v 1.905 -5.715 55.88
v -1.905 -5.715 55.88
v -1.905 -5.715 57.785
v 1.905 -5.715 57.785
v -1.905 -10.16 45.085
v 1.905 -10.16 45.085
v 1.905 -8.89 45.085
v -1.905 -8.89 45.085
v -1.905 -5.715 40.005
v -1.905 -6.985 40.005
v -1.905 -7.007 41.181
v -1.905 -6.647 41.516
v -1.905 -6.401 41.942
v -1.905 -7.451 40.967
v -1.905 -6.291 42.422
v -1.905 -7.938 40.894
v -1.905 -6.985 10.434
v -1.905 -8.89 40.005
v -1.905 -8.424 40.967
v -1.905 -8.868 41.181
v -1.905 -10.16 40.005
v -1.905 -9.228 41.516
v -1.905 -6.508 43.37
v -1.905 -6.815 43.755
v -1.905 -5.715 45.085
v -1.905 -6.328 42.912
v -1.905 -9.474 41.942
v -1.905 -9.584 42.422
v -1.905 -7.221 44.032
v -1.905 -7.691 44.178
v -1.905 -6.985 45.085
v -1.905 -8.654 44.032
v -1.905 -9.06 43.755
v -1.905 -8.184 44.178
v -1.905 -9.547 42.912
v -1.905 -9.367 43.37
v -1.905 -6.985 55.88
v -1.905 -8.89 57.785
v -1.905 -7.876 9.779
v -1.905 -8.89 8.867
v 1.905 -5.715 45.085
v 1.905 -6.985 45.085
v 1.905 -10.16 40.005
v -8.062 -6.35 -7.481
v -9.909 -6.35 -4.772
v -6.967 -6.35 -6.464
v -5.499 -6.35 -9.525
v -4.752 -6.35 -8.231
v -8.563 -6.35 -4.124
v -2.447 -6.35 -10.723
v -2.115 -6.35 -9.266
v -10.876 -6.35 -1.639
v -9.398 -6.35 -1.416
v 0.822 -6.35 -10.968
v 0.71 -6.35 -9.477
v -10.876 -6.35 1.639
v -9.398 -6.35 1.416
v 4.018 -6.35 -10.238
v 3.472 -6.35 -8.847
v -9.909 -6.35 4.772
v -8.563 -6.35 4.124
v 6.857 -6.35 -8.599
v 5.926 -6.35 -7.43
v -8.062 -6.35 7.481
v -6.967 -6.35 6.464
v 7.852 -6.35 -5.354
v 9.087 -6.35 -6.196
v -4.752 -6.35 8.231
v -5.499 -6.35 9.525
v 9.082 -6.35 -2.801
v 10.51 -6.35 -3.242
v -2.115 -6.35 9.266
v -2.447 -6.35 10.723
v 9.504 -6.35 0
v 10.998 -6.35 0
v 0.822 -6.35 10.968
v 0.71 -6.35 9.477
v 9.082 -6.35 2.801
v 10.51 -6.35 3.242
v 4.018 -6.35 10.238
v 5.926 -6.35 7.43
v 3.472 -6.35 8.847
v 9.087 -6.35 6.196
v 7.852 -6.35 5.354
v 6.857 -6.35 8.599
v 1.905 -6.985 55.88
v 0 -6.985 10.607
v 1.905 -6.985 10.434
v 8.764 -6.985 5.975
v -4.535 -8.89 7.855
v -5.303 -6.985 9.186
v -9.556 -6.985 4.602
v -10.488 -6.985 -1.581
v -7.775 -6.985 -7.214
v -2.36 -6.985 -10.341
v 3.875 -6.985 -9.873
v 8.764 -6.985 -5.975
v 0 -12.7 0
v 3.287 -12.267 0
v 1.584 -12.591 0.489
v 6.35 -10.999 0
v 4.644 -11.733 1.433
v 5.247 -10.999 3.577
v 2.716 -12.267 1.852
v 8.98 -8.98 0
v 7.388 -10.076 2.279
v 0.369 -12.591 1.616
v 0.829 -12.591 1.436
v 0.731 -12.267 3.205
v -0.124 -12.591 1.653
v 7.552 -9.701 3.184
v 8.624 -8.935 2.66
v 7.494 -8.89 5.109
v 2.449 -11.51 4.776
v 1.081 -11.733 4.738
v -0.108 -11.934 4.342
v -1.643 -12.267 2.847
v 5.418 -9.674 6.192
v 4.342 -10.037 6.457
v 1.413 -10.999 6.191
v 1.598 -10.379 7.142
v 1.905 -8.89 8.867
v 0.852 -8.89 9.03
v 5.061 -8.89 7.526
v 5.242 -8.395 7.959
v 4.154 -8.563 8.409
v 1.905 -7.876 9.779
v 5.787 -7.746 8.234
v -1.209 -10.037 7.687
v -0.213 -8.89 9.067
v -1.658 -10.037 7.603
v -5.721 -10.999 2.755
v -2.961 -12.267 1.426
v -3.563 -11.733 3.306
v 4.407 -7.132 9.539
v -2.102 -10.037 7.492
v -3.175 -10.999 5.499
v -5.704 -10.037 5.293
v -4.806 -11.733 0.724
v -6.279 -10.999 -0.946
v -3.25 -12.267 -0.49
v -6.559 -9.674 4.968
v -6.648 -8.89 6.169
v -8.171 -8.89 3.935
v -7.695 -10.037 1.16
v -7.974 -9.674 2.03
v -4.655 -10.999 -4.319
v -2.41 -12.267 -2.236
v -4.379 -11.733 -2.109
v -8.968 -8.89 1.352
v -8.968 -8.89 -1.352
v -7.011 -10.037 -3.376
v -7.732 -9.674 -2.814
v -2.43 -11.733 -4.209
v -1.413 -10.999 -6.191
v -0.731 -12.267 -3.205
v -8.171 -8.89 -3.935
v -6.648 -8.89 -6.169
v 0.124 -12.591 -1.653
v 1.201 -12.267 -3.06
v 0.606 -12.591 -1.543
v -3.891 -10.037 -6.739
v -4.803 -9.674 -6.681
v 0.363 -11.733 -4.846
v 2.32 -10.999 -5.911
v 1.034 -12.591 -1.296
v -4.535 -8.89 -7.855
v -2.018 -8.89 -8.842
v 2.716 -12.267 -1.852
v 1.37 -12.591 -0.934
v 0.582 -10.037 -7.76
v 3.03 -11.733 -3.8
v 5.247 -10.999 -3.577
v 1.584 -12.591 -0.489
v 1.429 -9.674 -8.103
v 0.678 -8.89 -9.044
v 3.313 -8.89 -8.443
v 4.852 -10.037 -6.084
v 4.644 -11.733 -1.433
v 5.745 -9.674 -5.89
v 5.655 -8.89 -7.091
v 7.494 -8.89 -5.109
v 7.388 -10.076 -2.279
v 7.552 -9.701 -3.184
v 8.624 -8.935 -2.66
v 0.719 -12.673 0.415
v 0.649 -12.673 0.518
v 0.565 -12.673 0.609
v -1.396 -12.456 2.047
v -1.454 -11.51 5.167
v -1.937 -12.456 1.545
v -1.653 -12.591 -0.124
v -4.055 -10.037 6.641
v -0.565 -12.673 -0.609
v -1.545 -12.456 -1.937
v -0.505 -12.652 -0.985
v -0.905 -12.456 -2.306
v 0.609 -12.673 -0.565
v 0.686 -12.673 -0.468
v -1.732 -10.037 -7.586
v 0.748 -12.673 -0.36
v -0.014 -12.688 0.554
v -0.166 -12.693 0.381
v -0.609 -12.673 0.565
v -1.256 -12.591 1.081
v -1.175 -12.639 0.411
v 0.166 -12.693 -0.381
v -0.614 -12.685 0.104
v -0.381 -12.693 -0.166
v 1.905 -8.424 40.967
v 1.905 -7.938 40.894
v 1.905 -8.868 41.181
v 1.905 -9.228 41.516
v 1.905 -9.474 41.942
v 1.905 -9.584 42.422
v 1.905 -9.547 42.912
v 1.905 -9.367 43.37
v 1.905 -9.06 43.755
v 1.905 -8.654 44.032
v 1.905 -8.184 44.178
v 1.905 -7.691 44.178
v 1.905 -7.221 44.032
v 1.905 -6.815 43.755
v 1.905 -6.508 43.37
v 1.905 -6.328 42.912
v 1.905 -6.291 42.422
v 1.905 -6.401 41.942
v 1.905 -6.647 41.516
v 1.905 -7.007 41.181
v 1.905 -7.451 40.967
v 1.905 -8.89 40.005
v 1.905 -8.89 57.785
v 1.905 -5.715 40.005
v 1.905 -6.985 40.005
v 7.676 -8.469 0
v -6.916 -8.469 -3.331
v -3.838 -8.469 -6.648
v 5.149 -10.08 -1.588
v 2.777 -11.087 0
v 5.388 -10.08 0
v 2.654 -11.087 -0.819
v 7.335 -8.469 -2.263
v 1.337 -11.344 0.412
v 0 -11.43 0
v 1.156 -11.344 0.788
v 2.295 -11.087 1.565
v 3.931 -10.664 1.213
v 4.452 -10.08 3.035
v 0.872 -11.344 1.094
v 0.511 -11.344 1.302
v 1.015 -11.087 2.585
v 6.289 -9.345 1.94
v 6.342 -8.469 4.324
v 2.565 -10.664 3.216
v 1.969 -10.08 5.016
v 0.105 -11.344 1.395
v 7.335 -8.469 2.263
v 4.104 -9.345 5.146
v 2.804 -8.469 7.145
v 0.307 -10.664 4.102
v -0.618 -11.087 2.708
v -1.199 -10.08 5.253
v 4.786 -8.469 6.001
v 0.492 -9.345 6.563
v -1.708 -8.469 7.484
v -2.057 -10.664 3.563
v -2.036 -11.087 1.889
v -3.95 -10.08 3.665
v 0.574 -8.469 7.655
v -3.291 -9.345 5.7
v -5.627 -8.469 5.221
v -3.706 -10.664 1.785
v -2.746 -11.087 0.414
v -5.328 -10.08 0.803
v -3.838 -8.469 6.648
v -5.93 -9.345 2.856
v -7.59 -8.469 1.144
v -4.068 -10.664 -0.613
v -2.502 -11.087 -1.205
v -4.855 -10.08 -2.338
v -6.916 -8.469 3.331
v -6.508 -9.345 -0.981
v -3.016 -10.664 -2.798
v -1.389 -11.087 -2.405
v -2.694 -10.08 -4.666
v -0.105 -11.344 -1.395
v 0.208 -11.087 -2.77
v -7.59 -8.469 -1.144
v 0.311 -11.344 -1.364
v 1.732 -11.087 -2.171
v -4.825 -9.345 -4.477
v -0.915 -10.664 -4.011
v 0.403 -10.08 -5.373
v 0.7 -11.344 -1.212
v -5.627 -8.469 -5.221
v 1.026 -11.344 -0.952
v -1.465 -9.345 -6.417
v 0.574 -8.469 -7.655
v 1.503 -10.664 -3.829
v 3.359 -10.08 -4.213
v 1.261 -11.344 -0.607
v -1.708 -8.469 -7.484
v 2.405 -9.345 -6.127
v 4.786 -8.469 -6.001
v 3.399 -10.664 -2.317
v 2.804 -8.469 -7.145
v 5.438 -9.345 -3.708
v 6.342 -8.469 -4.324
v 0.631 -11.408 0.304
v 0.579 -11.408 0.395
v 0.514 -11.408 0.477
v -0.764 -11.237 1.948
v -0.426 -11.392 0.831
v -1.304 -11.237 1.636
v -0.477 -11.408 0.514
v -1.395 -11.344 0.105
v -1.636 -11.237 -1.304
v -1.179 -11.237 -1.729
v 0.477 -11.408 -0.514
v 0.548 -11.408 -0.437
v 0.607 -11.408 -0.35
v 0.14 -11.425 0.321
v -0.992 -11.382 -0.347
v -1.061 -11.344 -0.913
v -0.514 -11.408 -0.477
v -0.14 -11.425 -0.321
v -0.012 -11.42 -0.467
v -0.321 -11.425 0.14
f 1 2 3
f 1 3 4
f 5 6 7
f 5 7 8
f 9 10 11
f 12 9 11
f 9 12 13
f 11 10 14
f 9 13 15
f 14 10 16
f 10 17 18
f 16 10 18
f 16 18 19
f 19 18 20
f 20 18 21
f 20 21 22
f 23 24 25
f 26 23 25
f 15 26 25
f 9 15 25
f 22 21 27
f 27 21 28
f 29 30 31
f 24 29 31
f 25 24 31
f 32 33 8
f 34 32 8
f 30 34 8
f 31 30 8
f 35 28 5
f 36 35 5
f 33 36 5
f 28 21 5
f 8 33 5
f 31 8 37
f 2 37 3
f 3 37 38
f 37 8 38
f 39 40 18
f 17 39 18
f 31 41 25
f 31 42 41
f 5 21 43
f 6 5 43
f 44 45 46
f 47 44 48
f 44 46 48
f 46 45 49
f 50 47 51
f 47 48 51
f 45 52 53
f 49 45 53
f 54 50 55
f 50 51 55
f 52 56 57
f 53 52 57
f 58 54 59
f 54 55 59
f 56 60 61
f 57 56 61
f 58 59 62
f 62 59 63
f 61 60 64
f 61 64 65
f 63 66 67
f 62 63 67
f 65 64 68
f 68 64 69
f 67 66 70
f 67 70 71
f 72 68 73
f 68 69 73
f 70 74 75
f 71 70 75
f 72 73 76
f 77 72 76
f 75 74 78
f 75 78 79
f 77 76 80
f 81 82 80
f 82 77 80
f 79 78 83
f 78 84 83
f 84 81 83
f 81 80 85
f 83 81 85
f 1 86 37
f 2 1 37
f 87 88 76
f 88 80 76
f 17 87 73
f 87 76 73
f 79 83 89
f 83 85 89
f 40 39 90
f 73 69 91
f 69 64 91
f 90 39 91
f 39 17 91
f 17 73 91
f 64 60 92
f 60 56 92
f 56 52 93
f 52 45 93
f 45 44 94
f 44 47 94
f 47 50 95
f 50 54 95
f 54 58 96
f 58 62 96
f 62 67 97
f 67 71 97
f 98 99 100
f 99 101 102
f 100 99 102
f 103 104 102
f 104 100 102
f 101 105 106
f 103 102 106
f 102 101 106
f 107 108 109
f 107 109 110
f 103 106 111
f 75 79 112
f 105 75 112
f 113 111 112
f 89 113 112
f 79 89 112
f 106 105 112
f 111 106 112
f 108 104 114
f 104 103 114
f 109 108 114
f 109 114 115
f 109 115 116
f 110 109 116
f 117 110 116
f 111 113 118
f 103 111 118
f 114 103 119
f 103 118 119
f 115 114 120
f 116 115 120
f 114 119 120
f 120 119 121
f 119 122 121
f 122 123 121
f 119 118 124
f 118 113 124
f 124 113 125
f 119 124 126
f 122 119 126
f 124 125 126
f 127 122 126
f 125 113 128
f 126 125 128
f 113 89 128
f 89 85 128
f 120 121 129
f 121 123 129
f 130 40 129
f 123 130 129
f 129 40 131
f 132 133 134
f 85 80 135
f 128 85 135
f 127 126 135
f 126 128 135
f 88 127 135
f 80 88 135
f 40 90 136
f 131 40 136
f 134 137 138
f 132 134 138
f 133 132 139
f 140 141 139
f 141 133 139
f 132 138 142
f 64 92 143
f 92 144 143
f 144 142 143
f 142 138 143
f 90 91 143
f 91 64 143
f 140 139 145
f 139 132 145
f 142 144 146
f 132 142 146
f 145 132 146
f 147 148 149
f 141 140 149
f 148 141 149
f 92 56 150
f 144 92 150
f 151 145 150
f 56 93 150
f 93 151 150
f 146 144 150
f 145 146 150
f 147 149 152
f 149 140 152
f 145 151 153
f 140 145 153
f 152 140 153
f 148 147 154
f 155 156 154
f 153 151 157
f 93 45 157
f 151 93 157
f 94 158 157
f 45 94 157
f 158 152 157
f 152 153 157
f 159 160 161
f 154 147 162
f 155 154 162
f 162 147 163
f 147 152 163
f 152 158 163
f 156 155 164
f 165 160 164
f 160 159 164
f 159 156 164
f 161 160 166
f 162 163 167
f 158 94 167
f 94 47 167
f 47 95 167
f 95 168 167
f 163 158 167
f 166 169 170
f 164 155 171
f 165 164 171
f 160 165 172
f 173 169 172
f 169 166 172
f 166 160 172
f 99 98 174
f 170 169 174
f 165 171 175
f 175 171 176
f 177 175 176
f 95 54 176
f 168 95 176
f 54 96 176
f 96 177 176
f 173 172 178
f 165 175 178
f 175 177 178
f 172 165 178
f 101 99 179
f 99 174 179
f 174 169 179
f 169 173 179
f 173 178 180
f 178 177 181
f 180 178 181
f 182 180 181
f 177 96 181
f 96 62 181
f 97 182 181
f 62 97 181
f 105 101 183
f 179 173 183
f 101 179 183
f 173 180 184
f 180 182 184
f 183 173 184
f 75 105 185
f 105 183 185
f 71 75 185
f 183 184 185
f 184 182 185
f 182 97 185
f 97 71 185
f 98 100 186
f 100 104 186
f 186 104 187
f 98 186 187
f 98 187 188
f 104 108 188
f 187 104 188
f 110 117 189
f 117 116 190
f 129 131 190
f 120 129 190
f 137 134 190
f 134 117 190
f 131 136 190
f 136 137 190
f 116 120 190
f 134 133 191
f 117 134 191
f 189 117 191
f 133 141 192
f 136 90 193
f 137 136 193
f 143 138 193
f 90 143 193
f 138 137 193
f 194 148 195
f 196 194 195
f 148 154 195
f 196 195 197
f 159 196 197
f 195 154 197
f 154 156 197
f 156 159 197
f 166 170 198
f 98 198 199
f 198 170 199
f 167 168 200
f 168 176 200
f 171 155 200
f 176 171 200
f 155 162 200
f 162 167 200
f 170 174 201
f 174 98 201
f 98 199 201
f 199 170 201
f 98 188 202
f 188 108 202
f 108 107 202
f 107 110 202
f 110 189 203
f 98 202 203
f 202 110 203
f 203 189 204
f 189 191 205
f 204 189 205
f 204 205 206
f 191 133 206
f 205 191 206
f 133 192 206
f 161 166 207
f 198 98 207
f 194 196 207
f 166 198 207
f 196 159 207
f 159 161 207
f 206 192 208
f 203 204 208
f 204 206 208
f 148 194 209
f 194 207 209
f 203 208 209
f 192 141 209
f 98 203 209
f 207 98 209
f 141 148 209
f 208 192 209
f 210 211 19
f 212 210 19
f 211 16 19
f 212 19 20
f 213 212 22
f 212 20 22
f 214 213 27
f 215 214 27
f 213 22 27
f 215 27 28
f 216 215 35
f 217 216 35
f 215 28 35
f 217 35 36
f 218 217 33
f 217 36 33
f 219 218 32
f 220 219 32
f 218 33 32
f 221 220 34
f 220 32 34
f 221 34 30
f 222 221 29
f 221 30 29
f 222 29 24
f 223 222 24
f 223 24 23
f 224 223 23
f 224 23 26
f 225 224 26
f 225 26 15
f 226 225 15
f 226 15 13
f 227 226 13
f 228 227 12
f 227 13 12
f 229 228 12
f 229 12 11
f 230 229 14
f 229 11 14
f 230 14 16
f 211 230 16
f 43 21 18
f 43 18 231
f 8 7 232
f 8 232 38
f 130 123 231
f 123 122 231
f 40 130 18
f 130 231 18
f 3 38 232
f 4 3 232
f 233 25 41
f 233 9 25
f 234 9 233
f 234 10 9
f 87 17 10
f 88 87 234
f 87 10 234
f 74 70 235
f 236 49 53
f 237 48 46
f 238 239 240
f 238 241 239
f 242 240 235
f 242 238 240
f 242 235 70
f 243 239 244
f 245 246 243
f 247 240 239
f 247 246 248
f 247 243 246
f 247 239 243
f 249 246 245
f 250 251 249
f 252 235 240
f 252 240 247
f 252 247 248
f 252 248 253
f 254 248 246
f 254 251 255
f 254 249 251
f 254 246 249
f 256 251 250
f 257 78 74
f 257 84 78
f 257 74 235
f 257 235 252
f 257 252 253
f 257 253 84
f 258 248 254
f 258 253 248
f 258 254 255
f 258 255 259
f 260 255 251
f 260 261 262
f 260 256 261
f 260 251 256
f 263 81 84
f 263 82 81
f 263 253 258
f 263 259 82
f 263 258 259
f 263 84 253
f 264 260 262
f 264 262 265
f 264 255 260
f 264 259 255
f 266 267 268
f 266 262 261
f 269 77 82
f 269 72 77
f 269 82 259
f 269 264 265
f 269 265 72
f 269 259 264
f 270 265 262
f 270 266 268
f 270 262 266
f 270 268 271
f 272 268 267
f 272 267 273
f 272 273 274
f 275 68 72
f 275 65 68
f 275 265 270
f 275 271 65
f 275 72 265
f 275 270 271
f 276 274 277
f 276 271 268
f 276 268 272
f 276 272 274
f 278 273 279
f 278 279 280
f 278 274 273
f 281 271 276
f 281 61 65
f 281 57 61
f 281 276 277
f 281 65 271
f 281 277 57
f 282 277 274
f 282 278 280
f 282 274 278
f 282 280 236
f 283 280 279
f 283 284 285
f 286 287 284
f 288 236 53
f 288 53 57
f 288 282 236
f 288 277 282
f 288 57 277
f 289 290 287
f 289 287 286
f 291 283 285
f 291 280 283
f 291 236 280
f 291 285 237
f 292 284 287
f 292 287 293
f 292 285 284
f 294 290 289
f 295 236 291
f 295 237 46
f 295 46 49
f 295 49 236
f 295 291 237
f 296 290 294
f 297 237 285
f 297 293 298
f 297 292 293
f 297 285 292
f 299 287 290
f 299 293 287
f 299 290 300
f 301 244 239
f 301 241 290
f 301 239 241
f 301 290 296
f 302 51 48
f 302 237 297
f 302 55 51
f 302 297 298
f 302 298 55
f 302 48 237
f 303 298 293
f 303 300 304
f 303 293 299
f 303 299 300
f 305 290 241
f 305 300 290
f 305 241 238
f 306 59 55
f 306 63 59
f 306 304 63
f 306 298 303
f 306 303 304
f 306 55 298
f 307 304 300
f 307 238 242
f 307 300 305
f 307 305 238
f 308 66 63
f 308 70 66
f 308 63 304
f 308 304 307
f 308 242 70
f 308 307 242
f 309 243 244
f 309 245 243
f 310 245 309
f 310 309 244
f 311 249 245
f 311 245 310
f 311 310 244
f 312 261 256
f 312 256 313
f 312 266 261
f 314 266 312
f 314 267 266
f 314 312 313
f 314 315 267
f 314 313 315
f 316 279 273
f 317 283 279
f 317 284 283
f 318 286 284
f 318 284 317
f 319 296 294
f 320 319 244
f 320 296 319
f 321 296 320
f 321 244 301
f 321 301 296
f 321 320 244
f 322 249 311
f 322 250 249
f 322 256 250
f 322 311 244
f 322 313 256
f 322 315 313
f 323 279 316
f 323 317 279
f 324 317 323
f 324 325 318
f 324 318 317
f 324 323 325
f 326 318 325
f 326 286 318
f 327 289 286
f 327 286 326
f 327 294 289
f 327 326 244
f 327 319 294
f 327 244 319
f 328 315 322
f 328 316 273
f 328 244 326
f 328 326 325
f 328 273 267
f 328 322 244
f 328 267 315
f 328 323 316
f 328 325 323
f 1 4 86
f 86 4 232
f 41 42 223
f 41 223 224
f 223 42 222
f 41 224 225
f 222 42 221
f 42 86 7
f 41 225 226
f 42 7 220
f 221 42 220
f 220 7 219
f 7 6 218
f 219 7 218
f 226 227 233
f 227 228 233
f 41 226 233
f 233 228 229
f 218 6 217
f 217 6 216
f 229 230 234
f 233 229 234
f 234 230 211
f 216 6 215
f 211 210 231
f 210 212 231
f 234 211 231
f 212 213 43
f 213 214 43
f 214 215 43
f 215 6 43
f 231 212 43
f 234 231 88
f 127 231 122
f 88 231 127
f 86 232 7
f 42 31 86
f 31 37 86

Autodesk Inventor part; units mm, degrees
ref_plane "YZ Plane" through (0, 0, 0) normal (1, 0, 0) x (0, 1, 0)
ref_plane "XZ Plane" through (0, 0, 0) normal (0, 1, 0) x (-1, 0, 0)
sketch "Sketch2" plane through (0, 0, 0) normal (0, 0, 1) x (1, 0, 0)
  arc A0 (0, -12.7) -> (10.9985, -6.35) centre (0, 0) ccw
  arc A1 (0, -11.43) -> (9.5038, -6.35) centre (0, 0) ccw
  line L0 (0, -11.43) -> (0, -12.7)
  line L1 (10.9985, -6.35) -> (9.5038, -6.35)
  dimension "d4" = 25.4
  dimension "d5" = 22.86
  dimension "d9" = 6.35
  dimension "d10" = 10.9985
revolve "Revolution1" add sketch "Sketch2" angle 360 about axis through (0, -11.43, 0) along (0, -1, 0)
ref_plane "Work Plane1" through (0, 0, 10.795) normal (0, 0, 1) x (1, 0, 0)
sketch "Sketch3" plane through (0, 0, 10.795) normal (0, 0, 1) x (1, 0, 0)
  line L0 (-1.905, -6.985) -> (1.905, -6.985)
  line L1 (1.905, -6.985) -> (1.905, -8.89)
  line L2 (1.905, -8.89) -> (-1.905, -8.89)
  line L3 (-1.905, -8.89) -> (-1.905, -6.985)
  line L4 (-10.9985, -6.35) -> (10.9985, -6.35) projected
  point P0 (0, 0)
  dimension "d12" = 1.905
  dimension "d13" = 1.905
  dimension "d14" = 1.905
  dimension "d15" = 0.635
extrude "Extrusion1" add sketch "Sketch3" along normal blind 46.99
sketch "Sketch4" plane through (0, 0, 10.795) normal (0, 0, -1) x (-1, 0, 0)
  line L0 (1.905, -6.985) -> (-1.905, -6.985) projected
  line L1 (-1.905, -6.985) -> (-1.905, -8.89) projected
  line L2 (-1.905, -8.89) -> (1.905, -8.89) projected
  line L3 (1.905, -8.89) -> (1.905, -6.985) projected
  point P0 (0, 0)
extrude "Extrusion2" add sketch "Sketch4" along normal blind 1.016
sketch "Sketch5" plane through (0, 0, 9.779) normal (0, 0, -1) x (-1, 0, 0)
  line L0 (-1.905, -8.89) -> (1.905, -8.89)
  line L1 (1.905, -8.89) -> (1.905, -7.876)
  line L2 (1.905, -7.876) -> (-1.905, -7.876)
  line L3 (-1.905, -7.876) -> (-1.905, -8.89)
  point P0 (0, 0)
extrude "Extrusion3" add sketch "Sketch5" along normal blind 1.016
sketch "Sketch6" plane through (1.905, -8.89, 57.785) normal (1, 0, 0) x (0, 0, -1)
  line L0 (0, 1.905) -> (47.3509, 1.905) projected
  line L1 (0, 0) -> (0, 1.905) projected
  point P0 (57.785, 8.89)
  point P1 (15.24, 0.9525)
  dimension "d24" = 0.9525
  dimension "d25" = 15.24
sketch "Sketch7" plane through (0, -6.985, 0) normal (0, 1, 0) x (1, 0, 0)
  line L0 (1.905, -57.785) -> (1.905, -8.8673) projected
  line L1 (-1.905, -10.4341) -> (-1.905, -57.785) projected
  line L2 (1.905, -45.085) -> (-1.905, -45.085)
  line L3 (-1.905, -45.085) -> (-1.905, -40.005)
  line L4 (-1.905, -40.005) -> (1.905, -40.005)
  line L5 (1.905, -40.005) -> (1.905, -45.085)
  line L6 (-9.5339, -42.545) -> (17.5873, -42.545) construction
  line L7 (1.905, -57.785) -> (-1.905, -57.785) construction
  point P0 (0, 0)
  dimension "d26" = 15.24
  dimension "d27" = 2.54
  dimension "d28" = 2.54
extrude "Extrusion4" add sketch "Sketch7" along normal blind 1.27 and the other way blind 3.175
hole "Hole1" at (1.905, -7.9375, 42.545) direction (-1, 0, 0) diameter 3.302 depth 25.4 tip angle 118
sketch "Sketch8" plane through (-1.905, -6.985, 57.785) normal (0, 1, 0) x (1, 0, 0)
  line L0 (3.81, 0) -> (3.81, 12.7) projected
  line L1 (0, 0) -> (3.81, 0)
  line L2 (3.81, 0) -> (3.81, 1.905)
  line L3 (3.81, 1.905) -> (0, 1.905)
  line L4 (0, 1.905) -> (0, 0)
  point P0 (1.905, 57.785)
  dimension "d40" = 1.905
extrude "Extrusion5" add sketch "Sketch8" along normal blind 1.27
properties part number "000205"
